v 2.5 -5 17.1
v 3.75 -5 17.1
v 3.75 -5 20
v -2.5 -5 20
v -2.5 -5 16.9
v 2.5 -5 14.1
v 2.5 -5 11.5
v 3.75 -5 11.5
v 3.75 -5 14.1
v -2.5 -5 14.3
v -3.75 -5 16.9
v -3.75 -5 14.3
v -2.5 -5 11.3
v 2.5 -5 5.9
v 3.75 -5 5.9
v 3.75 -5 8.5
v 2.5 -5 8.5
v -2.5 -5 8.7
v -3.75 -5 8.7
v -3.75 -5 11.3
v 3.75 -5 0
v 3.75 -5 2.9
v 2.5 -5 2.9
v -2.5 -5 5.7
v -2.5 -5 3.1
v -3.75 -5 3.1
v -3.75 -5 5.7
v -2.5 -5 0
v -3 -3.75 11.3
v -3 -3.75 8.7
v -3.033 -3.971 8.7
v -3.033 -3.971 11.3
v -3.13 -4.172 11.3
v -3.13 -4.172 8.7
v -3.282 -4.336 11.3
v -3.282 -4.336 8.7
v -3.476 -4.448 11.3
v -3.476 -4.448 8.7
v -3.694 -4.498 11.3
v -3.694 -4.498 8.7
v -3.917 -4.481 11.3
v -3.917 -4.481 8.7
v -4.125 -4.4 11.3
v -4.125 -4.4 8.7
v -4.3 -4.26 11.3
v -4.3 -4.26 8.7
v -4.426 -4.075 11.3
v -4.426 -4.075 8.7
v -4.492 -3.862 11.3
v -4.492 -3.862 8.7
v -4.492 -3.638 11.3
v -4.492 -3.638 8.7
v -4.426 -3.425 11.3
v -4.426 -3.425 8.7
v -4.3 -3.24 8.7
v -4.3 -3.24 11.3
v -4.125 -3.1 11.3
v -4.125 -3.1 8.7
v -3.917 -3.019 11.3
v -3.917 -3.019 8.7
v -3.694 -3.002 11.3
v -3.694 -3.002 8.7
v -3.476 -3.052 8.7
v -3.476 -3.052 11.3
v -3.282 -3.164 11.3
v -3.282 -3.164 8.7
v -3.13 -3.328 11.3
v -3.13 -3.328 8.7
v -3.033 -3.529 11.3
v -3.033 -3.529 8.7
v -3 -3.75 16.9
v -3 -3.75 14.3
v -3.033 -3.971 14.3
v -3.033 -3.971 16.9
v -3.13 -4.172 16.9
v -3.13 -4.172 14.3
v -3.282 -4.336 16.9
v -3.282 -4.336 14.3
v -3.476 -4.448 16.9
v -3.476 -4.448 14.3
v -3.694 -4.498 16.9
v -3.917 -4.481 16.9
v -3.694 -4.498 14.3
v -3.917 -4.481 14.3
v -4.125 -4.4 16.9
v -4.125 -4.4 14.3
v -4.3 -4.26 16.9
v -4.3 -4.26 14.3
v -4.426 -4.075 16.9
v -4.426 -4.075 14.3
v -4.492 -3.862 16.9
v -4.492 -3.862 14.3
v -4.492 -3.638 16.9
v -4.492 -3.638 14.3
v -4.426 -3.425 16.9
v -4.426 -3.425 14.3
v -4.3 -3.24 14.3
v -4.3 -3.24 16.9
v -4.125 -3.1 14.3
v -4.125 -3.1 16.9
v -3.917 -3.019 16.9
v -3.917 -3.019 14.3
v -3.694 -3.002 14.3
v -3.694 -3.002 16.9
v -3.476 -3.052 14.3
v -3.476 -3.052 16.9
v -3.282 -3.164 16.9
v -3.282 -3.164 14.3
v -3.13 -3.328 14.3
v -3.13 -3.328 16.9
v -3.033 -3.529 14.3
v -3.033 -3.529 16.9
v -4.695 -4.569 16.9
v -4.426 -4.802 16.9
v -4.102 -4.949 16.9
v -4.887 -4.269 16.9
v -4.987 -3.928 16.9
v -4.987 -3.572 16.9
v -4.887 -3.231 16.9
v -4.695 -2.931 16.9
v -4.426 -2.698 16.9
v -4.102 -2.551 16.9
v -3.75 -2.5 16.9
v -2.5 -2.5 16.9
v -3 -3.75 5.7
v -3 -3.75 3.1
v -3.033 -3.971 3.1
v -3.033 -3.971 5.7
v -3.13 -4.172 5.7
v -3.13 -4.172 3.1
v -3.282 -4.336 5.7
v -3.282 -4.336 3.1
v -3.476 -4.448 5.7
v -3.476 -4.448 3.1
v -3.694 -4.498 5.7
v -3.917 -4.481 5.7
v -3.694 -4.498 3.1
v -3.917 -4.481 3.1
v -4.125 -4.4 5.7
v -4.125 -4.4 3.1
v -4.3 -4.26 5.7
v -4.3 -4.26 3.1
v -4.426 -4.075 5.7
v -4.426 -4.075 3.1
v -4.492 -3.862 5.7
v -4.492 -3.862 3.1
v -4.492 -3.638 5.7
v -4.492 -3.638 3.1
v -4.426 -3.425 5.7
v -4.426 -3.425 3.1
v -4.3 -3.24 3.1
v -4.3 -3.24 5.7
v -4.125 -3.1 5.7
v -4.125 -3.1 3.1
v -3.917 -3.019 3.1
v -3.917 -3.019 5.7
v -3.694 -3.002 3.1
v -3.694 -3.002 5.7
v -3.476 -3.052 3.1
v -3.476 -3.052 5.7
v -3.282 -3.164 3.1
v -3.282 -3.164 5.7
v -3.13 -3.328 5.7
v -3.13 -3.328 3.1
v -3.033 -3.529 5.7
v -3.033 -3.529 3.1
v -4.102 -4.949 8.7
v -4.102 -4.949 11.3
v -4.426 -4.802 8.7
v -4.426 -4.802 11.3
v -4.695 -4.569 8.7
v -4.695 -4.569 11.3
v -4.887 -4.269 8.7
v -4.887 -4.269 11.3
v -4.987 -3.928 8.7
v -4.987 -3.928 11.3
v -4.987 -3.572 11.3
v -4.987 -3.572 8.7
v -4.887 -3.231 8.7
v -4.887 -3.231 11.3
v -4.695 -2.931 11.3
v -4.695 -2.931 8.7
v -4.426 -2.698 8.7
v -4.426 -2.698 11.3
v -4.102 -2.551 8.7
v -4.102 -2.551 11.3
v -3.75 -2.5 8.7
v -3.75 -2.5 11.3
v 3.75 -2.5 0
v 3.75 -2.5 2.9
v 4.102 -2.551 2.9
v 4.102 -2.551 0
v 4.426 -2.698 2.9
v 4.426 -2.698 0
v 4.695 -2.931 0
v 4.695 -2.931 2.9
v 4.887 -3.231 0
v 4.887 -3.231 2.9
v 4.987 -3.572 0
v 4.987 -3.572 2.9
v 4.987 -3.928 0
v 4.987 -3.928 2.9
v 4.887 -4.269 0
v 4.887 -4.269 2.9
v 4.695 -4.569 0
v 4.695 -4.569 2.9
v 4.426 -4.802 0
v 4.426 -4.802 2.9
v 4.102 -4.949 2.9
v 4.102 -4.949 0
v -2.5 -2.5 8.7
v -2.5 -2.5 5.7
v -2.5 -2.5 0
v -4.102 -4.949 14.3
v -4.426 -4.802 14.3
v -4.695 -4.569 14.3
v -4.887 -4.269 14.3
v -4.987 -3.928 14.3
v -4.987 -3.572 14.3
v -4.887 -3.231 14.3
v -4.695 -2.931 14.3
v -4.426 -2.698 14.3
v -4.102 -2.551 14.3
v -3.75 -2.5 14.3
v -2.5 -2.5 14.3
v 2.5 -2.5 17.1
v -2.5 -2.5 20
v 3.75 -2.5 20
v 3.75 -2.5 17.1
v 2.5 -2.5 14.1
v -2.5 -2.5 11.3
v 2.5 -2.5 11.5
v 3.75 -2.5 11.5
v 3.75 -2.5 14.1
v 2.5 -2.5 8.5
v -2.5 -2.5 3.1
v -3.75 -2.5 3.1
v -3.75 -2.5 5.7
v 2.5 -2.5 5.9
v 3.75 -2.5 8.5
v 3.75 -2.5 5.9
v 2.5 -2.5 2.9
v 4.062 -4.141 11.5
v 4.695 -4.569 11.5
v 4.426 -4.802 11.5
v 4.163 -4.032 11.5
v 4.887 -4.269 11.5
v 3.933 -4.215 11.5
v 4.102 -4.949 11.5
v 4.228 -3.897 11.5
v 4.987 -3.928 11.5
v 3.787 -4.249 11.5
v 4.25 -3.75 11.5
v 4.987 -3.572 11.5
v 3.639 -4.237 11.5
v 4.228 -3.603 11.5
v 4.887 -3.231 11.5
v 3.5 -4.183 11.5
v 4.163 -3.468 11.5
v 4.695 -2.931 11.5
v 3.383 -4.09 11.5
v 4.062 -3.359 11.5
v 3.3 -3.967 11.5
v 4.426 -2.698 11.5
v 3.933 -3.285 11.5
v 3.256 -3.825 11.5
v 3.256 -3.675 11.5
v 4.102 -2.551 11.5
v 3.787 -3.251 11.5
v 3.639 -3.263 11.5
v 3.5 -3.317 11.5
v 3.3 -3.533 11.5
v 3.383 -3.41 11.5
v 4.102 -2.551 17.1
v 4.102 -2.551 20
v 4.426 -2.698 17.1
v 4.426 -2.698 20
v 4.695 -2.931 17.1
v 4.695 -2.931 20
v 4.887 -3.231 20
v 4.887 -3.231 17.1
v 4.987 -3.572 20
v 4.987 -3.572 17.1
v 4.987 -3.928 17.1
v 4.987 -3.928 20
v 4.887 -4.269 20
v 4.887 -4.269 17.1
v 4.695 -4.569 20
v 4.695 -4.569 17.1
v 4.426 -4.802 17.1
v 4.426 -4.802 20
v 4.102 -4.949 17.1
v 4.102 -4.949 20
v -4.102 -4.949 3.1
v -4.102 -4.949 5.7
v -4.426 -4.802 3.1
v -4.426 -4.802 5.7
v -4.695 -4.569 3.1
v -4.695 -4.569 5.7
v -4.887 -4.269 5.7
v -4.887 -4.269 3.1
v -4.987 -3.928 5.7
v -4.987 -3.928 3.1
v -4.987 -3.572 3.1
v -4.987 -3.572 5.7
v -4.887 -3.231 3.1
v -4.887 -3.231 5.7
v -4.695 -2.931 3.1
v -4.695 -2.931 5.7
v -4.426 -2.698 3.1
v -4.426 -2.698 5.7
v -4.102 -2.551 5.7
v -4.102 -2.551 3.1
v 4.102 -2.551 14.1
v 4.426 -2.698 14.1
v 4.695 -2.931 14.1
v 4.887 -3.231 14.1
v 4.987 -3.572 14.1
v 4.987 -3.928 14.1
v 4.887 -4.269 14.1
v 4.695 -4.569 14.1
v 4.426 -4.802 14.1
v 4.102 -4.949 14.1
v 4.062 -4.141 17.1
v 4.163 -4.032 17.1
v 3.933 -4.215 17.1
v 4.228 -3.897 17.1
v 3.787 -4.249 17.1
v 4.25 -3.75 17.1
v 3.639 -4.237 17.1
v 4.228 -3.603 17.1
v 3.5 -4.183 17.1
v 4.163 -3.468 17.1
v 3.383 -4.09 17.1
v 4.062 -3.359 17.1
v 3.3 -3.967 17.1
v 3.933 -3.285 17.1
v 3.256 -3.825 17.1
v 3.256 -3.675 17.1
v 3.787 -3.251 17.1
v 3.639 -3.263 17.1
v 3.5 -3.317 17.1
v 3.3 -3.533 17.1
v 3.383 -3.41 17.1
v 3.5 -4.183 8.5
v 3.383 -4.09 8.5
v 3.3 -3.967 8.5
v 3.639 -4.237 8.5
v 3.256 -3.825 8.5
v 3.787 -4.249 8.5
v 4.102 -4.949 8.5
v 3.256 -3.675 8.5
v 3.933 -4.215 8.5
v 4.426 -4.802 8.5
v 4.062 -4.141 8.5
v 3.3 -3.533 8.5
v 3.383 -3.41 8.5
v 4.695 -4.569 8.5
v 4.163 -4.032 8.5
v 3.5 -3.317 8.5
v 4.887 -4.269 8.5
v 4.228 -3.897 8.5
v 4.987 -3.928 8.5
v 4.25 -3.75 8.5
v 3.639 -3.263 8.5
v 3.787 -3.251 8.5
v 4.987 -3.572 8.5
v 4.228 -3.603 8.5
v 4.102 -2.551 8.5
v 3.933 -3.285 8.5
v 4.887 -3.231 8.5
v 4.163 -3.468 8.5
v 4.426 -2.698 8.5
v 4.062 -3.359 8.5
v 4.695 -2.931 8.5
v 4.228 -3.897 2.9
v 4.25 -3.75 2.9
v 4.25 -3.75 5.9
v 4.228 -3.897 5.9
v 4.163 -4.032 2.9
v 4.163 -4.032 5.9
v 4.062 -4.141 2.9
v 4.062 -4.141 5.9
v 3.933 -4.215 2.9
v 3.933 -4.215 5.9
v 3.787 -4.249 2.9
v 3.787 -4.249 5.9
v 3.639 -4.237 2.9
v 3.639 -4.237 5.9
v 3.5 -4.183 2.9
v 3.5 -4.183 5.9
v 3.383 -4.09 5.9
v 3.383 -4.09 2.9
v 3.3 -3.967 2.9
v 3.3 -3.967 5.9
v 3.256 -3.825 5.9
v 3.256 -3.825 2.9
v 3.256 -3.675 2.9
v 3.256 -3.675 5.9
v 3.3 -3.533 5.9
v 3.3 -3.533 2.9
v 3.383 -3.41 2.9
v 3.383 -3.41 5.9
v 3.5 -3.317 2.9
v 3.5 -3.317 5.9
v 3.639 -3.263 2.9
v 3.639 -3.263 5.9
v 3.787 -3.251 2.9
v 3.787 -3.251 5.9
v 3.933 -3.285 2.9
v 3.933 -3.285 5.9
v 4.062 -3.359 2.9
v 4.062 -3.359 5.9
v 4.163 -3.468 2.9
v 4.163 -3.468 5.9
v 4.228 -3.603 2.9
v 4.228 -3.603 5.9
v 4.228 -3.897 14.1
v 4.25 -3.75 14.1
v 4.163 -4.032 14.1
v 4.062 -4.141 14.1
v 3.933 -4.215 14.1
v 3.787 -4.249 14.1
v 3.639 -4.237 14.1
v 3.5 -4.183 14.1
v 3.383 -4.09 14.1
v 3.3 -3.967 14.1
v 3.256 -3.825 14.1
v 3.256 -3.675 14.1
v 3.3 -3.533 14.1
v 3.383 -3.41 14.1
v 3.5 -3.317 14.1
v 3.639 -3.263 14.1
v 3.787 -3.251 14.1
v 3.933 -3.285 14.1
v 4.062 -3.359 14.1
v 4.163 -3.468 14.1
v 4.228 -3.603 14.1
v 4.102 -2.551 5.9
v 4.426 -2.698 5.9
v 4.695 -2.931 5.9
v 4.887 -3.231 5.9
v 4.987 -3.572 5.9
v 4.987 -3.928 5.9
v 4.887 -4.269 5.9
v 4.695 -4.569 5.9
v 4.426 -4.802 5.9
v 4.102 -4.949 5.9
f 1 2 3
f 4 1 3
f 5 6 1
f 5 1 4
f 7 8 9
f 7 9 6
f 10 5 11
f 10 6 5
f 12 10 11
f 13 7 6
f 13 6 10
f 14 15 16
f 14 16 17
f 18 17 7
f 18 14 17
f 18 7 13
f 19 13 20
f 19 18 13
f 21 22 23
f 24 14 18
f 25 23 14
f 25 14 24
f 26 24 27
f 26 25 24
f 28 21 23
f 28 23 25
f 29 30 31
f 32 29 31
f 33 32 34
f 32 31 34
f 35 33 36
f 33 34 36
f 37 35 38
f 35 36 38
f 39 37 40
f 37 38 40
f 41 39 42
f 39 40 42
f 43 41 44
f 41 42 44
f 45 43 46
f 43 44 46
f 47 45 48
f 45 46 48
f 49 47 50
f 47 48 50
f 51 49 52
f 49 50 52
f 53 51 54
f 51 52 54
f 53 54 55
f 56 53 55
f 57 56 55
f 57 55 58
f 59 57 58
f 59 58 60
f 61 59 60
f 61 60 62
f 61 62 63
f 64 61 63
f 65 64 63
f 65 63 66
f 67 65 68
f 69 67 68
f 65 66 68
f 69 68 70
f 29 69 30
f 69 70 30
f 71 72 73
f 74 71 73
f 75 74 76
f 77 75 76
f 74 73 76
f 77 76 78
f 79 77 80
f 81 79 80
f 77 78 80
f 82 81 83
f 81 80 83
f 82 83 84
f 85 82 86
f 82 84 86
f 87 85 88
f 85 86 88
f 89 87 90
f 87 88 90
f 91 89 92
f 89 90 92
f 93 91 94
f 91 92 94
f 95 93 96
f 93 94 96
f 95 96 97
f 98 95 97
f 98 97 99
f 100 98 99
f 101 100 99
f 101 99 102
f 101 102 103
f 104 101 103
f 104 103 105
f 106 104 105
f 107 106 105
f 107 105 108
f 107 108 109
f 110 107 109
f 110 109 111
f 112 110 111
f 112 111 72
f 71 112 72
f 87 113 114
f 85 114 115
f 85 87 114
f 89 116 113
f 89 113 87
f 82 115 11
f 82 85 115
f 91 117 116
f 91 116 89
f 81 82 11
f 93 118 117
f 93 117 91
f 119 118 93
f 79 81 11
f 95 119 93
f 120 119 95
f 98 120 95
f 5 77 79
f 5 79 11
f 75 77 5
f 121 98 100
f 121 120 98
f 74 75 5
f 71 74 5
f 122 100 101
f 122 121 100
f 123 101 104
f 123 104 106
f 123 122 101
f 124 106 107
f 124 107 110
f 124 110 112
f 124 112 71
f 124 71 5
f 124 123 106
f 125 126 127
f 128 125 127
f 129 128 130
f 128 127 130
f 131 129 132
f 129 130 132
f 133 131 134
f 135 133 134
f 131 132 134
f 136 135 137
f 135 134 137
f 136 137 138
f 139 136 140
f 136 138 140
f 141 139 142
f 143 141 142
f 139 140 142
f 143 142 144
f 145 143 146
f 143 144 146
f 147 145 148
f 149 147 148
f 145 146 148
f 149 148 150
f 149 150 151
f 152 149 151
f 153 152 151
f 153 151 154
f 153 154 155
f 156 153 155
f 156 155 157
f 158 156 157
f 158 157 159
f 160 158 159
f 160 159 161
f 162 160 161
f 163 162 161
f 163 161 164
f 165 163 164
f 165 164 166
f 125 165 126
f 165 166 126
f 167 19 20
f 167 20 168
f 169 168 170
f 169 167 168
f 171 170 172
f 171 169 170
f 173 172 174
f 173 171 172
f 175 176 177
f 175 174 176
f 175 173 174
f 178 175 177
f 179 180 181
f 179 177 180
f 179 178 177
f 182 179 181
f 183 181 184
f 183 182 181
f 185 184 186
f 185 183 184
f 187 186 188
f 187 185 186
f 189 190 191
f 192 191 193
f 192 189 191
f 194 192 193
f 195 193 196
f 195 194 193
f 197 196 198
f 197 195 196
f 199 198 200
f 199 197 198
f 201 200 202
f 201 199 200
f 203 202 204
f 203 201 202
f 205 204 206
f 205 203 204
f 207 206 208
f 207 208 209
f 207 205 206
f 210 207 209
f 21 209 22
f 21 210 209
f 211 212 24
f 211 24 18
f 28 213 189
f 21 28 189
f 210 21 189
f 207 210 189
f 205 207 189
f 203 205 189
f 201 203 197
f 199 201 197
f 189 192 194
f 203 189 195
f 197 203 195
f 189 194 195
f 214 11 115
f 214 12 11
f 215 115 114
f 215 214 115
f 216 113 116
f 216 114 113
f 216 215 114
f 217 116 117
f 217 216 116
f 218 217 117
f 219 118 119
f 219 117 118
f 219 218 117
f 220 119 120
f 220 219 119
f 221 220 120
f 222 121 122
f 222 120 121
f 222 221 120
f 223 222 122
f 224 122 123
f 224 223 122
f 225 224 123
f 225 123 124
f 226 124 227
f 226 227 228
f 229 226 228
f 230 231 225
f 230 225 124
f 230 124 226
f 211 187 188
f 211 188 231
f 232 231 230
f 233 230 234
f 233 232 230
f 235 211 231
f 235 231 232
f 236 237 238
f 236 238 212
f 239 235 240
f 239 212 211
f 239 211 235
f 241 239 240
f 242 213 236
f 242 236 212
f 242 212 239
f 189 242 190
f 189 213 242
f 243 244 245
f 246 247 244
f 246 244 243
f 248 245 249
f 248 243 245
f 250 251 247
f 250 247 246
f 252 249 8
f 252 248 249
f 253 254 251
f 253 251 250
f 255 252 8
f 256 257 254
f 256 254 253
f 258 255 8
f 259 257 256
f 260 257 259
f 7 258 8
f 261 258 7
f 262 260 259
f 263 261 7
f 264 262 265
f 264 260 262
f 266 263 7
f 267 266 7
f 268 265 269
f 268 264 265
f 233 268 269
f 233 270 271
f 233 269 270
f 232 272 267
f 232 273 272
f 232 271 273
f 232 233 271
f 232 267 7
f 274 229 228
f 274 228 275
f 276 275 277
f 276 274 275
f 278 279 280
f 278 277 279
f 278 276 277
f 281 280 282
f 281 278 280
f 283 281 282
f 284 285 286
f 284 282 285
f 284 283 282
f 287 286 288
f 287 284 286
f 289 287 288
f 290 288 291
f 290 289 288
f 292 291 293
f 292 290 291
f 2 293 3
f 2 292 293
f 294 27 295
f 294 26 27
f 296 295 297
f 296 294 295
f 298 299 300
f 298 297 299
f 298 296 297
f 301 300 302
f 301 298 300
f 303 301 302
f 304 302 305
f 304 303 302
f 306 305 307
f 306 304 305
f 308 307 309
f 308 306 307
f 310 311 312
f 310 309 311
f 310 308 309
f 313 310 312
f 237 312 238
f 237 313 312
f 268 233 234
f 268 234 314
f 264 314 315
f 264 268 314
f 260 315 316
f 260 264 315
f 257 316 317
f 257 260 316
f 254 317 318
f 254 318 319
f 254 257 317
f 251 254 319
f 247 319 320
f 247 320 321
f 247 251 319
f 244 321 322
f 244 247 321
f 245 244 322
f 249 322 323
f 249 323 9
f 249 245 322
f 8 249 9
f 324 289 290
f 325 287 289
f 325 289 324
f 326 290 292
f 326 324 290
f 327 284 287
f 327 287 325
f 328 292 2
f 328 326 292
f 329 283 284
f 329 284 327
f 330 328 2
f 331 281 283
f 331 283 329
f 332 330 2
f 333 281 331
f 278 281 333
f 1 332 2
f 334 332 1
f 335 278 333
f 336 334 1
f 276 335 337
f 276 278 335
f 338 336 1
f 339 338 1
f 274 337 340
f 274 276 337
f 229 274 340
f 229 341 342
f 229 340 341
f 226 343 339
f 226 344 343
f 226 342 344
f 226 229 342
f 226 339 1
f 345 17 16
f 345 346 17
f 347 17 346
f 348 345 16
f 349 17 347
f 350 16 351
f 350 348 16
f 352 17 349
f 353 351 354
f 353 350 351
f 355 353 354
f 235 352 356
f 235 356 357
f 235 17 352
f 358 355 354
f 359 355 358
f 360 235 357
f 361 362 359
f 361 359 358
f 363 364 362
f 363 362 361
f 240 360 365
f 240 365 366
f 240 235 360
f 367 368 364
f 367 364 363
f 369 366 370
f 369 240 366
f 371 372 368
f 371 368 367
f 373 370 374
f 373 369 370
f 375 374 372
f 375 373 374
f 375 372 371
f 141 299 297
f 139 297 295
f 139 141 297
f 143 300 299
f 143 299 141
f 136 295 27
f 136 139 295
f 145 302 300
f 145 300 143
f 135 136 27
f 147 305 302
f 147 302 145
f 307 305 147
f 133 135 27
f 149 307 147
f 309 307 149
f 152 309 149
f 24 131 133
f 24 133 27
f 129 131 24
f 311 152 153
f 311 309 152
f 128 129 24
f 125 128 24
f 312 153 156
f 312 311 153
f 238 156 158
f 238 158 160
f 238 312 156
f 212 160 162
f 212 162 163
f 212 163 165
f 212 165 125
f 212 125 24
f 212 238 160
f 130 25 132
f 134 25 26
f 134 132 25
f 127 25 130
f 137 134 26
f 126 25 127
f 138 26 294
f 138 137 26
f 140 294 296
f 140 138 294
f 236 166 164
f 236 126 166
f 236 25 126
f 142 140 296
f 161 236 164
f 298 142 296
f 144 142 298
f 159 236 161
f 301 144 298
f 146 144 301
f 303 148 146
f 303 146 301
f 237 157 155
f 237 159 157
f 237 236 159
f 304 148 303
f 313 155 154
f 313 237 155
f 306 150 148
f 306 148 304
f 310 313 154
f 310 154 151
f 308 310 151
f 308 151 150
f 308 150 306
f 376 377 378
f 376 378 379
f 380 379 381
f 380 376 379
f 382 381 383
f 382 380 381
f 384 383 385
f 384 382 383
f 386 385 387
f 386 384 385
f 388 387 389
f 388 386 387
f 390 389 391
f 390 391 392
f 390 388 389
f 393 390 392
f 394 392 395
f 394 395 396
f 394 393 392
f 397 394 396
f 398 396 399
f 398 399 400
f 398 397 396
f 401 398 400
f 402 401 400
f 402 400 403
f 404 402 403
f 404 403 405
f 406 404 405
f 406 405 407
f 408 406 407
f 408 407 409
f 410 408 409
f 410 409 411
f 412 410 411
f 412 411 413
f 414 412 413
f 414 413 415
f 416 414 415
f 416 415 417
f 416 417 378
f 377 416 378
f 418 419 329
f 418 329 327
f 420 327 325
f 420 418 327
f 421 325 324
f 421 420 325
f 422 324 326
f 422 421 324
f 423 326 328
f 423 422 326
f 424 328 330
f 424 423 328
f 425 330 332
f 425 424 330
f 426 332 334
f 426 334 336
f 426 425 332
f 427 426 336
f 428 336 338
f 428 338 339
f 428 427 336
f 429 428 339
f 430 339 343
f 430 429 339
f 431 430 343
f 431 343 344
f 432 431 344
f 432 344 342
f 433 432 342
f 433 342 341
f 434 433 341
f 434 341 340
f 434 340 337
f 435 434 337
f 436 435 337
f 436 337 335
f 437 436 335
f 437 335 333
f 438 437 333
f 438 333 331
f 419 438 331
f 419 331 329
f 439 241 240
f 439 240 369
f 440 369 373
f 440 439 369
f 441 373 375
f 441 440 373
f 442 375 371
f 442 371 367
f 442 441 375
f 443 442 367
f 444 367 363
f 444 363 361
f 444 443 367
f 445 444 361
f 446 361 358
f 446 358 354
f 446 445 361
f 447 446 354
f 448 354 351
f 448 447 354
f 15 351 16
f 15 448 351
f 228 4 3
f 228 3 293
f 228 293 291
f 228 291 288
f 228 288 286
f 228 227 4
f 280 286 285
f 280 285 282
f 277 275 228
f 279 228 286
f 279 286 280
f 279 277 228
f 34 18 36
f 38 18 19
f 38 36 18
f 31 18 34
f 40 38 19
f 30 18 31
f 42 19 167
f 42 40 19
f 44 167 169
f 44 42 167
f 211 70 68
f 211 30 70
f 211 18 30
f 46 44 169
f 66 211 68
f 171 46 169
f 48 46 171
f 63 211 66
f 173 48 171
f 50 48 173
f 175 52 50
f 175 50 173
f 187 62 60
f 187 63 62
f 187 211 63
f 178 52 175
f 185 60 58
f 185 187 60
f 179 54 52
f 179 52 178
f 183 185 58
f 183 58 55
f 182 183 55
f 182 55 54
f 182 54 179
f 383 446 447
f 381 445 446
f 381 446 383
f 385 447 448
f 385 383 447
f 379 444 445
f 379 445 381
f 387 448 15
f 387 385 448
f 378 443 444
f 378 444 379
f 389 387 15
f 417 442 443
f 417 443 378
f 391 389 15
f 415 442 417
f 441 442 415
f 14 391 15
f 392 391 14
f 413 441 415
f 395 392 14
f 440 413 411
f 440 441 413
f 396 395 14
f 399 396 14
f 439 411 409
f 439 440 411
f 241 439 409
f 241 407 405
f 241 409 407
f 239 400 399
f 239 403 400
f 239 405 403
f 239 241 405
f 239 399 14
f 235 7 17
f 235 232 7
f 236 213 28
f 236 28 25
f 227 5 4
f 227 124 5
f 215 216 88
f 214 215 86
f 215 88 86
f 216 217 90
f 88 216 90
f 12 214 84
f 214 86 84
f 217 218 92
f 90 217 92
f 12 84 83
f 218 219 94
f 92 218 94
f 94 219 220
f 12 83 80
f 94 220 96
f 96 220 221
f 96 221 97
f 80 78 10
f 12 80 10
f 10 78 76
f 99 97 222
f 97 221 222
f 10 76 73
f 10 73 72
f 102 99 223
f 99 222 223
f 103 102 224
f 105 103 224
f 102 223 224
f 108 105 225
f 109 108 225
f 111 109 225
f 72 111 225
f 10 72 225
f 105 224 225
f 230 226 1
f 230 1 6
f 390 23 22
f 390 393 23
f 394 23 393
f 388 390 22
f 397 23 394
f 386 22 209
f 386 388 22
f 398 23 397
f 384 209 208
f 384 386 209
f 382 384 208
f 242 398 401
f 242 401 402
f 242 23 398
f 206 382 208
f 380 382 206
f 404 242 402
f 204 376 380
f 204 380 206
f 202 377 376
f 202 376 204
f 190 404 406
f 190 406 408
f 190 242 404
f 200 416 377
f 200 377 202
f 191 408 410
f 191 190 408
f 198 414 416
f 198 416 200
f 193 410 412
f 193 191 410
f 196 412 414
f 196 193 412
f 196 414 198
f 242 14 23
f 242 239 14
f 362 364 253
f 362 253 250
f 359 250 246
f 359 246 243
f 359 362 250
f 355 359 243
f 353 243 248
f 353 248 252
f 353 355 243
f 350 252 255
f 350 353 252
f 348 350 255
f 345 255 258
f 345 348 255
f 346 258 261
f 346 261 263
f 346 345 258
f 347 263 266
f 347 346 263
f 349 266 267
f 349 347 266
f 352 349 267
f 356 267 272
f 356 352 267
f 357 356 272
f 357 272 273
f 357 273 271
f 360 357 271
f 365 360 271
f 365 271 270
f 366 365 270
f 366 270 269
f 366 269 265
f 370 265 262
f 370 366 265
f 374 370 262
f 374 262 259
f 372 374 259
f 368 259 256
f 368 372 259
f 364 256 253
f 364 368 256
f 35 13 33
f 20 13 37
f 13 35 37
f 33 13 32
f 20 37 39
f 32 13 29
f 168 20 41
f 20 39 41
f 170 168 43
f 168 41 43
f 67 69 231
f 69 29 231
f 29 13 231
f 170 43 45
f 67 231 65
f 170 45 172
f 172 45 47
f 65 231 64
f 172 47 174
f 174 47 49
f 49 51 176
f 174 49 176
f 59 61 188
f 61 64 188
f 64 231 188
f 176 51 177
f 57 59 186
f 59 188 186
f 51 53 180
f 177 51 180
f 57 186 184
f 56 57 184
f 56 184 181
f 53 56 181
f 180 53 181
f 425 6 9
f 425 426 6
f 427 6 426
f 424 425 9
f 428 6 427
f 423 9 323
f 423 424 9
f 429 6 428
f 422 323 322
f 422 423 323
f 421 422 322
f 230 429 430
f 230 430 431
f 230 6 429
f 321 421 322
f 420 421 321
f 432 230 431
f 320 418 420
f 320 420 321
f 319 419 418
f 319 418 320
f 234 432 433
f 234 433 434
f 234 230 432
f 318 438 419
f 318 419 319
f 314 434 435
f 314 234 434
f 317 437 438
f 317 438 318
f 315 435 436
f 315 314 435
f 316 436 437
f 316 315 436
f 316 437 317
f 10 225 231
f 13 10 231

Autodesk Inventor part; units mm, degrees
ref_plane "YZ Plane" through (0, 0, 0) normal (1, 0, 0) x (0, 1, 0)
ref_plane "XZ Plane" through (0, 0, 0) normal (0, 1, 0) x (-1, 0, 0)
ref_plane "XY Plane" through (0, 0, 0) normal (0, 0, 1) x (1, 0, 0)
sketch "Sketch1" plane through (0, 0, 0) normal (0, 0, 1) x (1, 0, 0)
  arc A0 (-3.75, -2.5) -> (-3.75, -5) centre (-3.75, -3.75) ccw
  arc A1 (3.75, -5) -> (3.75, -2.5) centre (3.75, -3.75) ccw
  line L0 (-3.75, -2.5) -> (3.75, -2.5)
  line L1 (3.75, -5) -> (-3.75, -5)
  circle A2 centre (-3.75, -3.75) radius 0.75
  circle A3 centre (3.75, -3.75) radius 0.5
  circle A4 centre (3.75, -3.75) radius 0.5
  point P0 (0, 0)
  dimension "d0" = 2.5
  dimension "d1" = 5
  dimension "d4" = 7.5
  dimension "d5" = 3.75
  dimension "d6" = 1.5
  dimension "d7" = 1
  dimension "d77" = 1
extrude "Extrusion1" add sketch "Sketch1" along normal blind 20
sketch "Sketch3" plane through (0, 0, 0) normal (0, 1, 0) x (-1, 0, 0)
  line L0 (5, 0) -> (3.75, 0) projected
  line L1 (-3.75, 0) -> (3.75, 0) projected
  line L2 (5, 16.9) -> (2.5, 16.9)
  line L3 (2.5, 16.9) -> (2.5, 20)
  line L4 (2.5, 20) -> (5, 20)
  line L5 (5, 20) -> (5, 16.9)
  line L6 (5, 14.3) -> (2.5, 14.3)
  line L7 (2.5, 14.3) -> (2.5, 11.3)
  line L8 (2.5, 11.3) -> (5, 11.3)
  line L9 (5, 11.3) -> (5, 14.3)
  line L10 (5, 5.7) -> (2.5, 5.7)
  line L11 (2.5, 5.7) -> (2.5, 8.7)
  line L12 (2.5, 8.7) -> (5, 8.7)
  line L13 (5, 8.7) -> (5, 5.7)
  line L14 (5, 0) -> (2.5, 0)
  line L15 (2.5, 0) -> (2.5, 3.1)
  line L16 (2.5, 3.1) -> (5, 3.1)
  line L17 (5, 3.1) -> (5, 0)
  line L18 (-2.5, 2.9) -> (-5, 2.9)
  line L19 (-5, 2.9) -> (-5, 5.9)
  line L20 (-5, 5.9) -> (-2.5, 5.9)
  line L21 (-2.5, 5.9) -> (-2.5, 2.9)
  line L22 (-2.5, 8.5) -> (-5, 8.5)
  line L23 (-5, 8.5) -> (-5, 11.5)
  line L24 (-5, 11.5) -> (-2.5, 11.5)
  line L25 (-2.5, 11.5) -> (-2.5, 8.5)
  line L26 (-2.5, 14.1) -> (-5, 14.1)
  line L27 (-5, 14.1) -> (-5, 17.1)
  line L28 (-5, 17.1) -> (-2.5, 17.1)
  line L29 (-2.5, 17.1) -> (-2.5, 14.1)
  point P0 (0, 0)
  point P1 (0, 0)
  point P2 (0, 0)
  point P3 (0, 0)
  point P4 (0, 0)
  point P5 (0, 0)
  point P6 (0, 0)
  point P7 (0, 0)
  point P8 (0, 0)
  dimension "d49" = 2.5
  dimension "d50" = 2.5
  dimension "d52" = 3.1
  dimension "d53" = 3.1
  dimension "d54" = 3
  dimension "d55" = 3
  dimension "d56" = 3
  dimension "d57" = 3
  dimension "d58" = 3
  dimension "d72" = 10
  dimension "d73" = 5
  dimension "d74" = 0
  dimension "d80" = 0.2
  dimension "d81" = 0.2
  dimension "d82" = 0.2
  dimension "d83" = 0.2
  dimension "d84" = 0.2
  dimension "d85" = 0.2
extrude "Extrusion2" cut sketch "Sketch3" against normal blind 20
extrude "Extrusion3" add sketch "Sketch1" along normal blind 20 contours A3
properties part number "chain_link"
